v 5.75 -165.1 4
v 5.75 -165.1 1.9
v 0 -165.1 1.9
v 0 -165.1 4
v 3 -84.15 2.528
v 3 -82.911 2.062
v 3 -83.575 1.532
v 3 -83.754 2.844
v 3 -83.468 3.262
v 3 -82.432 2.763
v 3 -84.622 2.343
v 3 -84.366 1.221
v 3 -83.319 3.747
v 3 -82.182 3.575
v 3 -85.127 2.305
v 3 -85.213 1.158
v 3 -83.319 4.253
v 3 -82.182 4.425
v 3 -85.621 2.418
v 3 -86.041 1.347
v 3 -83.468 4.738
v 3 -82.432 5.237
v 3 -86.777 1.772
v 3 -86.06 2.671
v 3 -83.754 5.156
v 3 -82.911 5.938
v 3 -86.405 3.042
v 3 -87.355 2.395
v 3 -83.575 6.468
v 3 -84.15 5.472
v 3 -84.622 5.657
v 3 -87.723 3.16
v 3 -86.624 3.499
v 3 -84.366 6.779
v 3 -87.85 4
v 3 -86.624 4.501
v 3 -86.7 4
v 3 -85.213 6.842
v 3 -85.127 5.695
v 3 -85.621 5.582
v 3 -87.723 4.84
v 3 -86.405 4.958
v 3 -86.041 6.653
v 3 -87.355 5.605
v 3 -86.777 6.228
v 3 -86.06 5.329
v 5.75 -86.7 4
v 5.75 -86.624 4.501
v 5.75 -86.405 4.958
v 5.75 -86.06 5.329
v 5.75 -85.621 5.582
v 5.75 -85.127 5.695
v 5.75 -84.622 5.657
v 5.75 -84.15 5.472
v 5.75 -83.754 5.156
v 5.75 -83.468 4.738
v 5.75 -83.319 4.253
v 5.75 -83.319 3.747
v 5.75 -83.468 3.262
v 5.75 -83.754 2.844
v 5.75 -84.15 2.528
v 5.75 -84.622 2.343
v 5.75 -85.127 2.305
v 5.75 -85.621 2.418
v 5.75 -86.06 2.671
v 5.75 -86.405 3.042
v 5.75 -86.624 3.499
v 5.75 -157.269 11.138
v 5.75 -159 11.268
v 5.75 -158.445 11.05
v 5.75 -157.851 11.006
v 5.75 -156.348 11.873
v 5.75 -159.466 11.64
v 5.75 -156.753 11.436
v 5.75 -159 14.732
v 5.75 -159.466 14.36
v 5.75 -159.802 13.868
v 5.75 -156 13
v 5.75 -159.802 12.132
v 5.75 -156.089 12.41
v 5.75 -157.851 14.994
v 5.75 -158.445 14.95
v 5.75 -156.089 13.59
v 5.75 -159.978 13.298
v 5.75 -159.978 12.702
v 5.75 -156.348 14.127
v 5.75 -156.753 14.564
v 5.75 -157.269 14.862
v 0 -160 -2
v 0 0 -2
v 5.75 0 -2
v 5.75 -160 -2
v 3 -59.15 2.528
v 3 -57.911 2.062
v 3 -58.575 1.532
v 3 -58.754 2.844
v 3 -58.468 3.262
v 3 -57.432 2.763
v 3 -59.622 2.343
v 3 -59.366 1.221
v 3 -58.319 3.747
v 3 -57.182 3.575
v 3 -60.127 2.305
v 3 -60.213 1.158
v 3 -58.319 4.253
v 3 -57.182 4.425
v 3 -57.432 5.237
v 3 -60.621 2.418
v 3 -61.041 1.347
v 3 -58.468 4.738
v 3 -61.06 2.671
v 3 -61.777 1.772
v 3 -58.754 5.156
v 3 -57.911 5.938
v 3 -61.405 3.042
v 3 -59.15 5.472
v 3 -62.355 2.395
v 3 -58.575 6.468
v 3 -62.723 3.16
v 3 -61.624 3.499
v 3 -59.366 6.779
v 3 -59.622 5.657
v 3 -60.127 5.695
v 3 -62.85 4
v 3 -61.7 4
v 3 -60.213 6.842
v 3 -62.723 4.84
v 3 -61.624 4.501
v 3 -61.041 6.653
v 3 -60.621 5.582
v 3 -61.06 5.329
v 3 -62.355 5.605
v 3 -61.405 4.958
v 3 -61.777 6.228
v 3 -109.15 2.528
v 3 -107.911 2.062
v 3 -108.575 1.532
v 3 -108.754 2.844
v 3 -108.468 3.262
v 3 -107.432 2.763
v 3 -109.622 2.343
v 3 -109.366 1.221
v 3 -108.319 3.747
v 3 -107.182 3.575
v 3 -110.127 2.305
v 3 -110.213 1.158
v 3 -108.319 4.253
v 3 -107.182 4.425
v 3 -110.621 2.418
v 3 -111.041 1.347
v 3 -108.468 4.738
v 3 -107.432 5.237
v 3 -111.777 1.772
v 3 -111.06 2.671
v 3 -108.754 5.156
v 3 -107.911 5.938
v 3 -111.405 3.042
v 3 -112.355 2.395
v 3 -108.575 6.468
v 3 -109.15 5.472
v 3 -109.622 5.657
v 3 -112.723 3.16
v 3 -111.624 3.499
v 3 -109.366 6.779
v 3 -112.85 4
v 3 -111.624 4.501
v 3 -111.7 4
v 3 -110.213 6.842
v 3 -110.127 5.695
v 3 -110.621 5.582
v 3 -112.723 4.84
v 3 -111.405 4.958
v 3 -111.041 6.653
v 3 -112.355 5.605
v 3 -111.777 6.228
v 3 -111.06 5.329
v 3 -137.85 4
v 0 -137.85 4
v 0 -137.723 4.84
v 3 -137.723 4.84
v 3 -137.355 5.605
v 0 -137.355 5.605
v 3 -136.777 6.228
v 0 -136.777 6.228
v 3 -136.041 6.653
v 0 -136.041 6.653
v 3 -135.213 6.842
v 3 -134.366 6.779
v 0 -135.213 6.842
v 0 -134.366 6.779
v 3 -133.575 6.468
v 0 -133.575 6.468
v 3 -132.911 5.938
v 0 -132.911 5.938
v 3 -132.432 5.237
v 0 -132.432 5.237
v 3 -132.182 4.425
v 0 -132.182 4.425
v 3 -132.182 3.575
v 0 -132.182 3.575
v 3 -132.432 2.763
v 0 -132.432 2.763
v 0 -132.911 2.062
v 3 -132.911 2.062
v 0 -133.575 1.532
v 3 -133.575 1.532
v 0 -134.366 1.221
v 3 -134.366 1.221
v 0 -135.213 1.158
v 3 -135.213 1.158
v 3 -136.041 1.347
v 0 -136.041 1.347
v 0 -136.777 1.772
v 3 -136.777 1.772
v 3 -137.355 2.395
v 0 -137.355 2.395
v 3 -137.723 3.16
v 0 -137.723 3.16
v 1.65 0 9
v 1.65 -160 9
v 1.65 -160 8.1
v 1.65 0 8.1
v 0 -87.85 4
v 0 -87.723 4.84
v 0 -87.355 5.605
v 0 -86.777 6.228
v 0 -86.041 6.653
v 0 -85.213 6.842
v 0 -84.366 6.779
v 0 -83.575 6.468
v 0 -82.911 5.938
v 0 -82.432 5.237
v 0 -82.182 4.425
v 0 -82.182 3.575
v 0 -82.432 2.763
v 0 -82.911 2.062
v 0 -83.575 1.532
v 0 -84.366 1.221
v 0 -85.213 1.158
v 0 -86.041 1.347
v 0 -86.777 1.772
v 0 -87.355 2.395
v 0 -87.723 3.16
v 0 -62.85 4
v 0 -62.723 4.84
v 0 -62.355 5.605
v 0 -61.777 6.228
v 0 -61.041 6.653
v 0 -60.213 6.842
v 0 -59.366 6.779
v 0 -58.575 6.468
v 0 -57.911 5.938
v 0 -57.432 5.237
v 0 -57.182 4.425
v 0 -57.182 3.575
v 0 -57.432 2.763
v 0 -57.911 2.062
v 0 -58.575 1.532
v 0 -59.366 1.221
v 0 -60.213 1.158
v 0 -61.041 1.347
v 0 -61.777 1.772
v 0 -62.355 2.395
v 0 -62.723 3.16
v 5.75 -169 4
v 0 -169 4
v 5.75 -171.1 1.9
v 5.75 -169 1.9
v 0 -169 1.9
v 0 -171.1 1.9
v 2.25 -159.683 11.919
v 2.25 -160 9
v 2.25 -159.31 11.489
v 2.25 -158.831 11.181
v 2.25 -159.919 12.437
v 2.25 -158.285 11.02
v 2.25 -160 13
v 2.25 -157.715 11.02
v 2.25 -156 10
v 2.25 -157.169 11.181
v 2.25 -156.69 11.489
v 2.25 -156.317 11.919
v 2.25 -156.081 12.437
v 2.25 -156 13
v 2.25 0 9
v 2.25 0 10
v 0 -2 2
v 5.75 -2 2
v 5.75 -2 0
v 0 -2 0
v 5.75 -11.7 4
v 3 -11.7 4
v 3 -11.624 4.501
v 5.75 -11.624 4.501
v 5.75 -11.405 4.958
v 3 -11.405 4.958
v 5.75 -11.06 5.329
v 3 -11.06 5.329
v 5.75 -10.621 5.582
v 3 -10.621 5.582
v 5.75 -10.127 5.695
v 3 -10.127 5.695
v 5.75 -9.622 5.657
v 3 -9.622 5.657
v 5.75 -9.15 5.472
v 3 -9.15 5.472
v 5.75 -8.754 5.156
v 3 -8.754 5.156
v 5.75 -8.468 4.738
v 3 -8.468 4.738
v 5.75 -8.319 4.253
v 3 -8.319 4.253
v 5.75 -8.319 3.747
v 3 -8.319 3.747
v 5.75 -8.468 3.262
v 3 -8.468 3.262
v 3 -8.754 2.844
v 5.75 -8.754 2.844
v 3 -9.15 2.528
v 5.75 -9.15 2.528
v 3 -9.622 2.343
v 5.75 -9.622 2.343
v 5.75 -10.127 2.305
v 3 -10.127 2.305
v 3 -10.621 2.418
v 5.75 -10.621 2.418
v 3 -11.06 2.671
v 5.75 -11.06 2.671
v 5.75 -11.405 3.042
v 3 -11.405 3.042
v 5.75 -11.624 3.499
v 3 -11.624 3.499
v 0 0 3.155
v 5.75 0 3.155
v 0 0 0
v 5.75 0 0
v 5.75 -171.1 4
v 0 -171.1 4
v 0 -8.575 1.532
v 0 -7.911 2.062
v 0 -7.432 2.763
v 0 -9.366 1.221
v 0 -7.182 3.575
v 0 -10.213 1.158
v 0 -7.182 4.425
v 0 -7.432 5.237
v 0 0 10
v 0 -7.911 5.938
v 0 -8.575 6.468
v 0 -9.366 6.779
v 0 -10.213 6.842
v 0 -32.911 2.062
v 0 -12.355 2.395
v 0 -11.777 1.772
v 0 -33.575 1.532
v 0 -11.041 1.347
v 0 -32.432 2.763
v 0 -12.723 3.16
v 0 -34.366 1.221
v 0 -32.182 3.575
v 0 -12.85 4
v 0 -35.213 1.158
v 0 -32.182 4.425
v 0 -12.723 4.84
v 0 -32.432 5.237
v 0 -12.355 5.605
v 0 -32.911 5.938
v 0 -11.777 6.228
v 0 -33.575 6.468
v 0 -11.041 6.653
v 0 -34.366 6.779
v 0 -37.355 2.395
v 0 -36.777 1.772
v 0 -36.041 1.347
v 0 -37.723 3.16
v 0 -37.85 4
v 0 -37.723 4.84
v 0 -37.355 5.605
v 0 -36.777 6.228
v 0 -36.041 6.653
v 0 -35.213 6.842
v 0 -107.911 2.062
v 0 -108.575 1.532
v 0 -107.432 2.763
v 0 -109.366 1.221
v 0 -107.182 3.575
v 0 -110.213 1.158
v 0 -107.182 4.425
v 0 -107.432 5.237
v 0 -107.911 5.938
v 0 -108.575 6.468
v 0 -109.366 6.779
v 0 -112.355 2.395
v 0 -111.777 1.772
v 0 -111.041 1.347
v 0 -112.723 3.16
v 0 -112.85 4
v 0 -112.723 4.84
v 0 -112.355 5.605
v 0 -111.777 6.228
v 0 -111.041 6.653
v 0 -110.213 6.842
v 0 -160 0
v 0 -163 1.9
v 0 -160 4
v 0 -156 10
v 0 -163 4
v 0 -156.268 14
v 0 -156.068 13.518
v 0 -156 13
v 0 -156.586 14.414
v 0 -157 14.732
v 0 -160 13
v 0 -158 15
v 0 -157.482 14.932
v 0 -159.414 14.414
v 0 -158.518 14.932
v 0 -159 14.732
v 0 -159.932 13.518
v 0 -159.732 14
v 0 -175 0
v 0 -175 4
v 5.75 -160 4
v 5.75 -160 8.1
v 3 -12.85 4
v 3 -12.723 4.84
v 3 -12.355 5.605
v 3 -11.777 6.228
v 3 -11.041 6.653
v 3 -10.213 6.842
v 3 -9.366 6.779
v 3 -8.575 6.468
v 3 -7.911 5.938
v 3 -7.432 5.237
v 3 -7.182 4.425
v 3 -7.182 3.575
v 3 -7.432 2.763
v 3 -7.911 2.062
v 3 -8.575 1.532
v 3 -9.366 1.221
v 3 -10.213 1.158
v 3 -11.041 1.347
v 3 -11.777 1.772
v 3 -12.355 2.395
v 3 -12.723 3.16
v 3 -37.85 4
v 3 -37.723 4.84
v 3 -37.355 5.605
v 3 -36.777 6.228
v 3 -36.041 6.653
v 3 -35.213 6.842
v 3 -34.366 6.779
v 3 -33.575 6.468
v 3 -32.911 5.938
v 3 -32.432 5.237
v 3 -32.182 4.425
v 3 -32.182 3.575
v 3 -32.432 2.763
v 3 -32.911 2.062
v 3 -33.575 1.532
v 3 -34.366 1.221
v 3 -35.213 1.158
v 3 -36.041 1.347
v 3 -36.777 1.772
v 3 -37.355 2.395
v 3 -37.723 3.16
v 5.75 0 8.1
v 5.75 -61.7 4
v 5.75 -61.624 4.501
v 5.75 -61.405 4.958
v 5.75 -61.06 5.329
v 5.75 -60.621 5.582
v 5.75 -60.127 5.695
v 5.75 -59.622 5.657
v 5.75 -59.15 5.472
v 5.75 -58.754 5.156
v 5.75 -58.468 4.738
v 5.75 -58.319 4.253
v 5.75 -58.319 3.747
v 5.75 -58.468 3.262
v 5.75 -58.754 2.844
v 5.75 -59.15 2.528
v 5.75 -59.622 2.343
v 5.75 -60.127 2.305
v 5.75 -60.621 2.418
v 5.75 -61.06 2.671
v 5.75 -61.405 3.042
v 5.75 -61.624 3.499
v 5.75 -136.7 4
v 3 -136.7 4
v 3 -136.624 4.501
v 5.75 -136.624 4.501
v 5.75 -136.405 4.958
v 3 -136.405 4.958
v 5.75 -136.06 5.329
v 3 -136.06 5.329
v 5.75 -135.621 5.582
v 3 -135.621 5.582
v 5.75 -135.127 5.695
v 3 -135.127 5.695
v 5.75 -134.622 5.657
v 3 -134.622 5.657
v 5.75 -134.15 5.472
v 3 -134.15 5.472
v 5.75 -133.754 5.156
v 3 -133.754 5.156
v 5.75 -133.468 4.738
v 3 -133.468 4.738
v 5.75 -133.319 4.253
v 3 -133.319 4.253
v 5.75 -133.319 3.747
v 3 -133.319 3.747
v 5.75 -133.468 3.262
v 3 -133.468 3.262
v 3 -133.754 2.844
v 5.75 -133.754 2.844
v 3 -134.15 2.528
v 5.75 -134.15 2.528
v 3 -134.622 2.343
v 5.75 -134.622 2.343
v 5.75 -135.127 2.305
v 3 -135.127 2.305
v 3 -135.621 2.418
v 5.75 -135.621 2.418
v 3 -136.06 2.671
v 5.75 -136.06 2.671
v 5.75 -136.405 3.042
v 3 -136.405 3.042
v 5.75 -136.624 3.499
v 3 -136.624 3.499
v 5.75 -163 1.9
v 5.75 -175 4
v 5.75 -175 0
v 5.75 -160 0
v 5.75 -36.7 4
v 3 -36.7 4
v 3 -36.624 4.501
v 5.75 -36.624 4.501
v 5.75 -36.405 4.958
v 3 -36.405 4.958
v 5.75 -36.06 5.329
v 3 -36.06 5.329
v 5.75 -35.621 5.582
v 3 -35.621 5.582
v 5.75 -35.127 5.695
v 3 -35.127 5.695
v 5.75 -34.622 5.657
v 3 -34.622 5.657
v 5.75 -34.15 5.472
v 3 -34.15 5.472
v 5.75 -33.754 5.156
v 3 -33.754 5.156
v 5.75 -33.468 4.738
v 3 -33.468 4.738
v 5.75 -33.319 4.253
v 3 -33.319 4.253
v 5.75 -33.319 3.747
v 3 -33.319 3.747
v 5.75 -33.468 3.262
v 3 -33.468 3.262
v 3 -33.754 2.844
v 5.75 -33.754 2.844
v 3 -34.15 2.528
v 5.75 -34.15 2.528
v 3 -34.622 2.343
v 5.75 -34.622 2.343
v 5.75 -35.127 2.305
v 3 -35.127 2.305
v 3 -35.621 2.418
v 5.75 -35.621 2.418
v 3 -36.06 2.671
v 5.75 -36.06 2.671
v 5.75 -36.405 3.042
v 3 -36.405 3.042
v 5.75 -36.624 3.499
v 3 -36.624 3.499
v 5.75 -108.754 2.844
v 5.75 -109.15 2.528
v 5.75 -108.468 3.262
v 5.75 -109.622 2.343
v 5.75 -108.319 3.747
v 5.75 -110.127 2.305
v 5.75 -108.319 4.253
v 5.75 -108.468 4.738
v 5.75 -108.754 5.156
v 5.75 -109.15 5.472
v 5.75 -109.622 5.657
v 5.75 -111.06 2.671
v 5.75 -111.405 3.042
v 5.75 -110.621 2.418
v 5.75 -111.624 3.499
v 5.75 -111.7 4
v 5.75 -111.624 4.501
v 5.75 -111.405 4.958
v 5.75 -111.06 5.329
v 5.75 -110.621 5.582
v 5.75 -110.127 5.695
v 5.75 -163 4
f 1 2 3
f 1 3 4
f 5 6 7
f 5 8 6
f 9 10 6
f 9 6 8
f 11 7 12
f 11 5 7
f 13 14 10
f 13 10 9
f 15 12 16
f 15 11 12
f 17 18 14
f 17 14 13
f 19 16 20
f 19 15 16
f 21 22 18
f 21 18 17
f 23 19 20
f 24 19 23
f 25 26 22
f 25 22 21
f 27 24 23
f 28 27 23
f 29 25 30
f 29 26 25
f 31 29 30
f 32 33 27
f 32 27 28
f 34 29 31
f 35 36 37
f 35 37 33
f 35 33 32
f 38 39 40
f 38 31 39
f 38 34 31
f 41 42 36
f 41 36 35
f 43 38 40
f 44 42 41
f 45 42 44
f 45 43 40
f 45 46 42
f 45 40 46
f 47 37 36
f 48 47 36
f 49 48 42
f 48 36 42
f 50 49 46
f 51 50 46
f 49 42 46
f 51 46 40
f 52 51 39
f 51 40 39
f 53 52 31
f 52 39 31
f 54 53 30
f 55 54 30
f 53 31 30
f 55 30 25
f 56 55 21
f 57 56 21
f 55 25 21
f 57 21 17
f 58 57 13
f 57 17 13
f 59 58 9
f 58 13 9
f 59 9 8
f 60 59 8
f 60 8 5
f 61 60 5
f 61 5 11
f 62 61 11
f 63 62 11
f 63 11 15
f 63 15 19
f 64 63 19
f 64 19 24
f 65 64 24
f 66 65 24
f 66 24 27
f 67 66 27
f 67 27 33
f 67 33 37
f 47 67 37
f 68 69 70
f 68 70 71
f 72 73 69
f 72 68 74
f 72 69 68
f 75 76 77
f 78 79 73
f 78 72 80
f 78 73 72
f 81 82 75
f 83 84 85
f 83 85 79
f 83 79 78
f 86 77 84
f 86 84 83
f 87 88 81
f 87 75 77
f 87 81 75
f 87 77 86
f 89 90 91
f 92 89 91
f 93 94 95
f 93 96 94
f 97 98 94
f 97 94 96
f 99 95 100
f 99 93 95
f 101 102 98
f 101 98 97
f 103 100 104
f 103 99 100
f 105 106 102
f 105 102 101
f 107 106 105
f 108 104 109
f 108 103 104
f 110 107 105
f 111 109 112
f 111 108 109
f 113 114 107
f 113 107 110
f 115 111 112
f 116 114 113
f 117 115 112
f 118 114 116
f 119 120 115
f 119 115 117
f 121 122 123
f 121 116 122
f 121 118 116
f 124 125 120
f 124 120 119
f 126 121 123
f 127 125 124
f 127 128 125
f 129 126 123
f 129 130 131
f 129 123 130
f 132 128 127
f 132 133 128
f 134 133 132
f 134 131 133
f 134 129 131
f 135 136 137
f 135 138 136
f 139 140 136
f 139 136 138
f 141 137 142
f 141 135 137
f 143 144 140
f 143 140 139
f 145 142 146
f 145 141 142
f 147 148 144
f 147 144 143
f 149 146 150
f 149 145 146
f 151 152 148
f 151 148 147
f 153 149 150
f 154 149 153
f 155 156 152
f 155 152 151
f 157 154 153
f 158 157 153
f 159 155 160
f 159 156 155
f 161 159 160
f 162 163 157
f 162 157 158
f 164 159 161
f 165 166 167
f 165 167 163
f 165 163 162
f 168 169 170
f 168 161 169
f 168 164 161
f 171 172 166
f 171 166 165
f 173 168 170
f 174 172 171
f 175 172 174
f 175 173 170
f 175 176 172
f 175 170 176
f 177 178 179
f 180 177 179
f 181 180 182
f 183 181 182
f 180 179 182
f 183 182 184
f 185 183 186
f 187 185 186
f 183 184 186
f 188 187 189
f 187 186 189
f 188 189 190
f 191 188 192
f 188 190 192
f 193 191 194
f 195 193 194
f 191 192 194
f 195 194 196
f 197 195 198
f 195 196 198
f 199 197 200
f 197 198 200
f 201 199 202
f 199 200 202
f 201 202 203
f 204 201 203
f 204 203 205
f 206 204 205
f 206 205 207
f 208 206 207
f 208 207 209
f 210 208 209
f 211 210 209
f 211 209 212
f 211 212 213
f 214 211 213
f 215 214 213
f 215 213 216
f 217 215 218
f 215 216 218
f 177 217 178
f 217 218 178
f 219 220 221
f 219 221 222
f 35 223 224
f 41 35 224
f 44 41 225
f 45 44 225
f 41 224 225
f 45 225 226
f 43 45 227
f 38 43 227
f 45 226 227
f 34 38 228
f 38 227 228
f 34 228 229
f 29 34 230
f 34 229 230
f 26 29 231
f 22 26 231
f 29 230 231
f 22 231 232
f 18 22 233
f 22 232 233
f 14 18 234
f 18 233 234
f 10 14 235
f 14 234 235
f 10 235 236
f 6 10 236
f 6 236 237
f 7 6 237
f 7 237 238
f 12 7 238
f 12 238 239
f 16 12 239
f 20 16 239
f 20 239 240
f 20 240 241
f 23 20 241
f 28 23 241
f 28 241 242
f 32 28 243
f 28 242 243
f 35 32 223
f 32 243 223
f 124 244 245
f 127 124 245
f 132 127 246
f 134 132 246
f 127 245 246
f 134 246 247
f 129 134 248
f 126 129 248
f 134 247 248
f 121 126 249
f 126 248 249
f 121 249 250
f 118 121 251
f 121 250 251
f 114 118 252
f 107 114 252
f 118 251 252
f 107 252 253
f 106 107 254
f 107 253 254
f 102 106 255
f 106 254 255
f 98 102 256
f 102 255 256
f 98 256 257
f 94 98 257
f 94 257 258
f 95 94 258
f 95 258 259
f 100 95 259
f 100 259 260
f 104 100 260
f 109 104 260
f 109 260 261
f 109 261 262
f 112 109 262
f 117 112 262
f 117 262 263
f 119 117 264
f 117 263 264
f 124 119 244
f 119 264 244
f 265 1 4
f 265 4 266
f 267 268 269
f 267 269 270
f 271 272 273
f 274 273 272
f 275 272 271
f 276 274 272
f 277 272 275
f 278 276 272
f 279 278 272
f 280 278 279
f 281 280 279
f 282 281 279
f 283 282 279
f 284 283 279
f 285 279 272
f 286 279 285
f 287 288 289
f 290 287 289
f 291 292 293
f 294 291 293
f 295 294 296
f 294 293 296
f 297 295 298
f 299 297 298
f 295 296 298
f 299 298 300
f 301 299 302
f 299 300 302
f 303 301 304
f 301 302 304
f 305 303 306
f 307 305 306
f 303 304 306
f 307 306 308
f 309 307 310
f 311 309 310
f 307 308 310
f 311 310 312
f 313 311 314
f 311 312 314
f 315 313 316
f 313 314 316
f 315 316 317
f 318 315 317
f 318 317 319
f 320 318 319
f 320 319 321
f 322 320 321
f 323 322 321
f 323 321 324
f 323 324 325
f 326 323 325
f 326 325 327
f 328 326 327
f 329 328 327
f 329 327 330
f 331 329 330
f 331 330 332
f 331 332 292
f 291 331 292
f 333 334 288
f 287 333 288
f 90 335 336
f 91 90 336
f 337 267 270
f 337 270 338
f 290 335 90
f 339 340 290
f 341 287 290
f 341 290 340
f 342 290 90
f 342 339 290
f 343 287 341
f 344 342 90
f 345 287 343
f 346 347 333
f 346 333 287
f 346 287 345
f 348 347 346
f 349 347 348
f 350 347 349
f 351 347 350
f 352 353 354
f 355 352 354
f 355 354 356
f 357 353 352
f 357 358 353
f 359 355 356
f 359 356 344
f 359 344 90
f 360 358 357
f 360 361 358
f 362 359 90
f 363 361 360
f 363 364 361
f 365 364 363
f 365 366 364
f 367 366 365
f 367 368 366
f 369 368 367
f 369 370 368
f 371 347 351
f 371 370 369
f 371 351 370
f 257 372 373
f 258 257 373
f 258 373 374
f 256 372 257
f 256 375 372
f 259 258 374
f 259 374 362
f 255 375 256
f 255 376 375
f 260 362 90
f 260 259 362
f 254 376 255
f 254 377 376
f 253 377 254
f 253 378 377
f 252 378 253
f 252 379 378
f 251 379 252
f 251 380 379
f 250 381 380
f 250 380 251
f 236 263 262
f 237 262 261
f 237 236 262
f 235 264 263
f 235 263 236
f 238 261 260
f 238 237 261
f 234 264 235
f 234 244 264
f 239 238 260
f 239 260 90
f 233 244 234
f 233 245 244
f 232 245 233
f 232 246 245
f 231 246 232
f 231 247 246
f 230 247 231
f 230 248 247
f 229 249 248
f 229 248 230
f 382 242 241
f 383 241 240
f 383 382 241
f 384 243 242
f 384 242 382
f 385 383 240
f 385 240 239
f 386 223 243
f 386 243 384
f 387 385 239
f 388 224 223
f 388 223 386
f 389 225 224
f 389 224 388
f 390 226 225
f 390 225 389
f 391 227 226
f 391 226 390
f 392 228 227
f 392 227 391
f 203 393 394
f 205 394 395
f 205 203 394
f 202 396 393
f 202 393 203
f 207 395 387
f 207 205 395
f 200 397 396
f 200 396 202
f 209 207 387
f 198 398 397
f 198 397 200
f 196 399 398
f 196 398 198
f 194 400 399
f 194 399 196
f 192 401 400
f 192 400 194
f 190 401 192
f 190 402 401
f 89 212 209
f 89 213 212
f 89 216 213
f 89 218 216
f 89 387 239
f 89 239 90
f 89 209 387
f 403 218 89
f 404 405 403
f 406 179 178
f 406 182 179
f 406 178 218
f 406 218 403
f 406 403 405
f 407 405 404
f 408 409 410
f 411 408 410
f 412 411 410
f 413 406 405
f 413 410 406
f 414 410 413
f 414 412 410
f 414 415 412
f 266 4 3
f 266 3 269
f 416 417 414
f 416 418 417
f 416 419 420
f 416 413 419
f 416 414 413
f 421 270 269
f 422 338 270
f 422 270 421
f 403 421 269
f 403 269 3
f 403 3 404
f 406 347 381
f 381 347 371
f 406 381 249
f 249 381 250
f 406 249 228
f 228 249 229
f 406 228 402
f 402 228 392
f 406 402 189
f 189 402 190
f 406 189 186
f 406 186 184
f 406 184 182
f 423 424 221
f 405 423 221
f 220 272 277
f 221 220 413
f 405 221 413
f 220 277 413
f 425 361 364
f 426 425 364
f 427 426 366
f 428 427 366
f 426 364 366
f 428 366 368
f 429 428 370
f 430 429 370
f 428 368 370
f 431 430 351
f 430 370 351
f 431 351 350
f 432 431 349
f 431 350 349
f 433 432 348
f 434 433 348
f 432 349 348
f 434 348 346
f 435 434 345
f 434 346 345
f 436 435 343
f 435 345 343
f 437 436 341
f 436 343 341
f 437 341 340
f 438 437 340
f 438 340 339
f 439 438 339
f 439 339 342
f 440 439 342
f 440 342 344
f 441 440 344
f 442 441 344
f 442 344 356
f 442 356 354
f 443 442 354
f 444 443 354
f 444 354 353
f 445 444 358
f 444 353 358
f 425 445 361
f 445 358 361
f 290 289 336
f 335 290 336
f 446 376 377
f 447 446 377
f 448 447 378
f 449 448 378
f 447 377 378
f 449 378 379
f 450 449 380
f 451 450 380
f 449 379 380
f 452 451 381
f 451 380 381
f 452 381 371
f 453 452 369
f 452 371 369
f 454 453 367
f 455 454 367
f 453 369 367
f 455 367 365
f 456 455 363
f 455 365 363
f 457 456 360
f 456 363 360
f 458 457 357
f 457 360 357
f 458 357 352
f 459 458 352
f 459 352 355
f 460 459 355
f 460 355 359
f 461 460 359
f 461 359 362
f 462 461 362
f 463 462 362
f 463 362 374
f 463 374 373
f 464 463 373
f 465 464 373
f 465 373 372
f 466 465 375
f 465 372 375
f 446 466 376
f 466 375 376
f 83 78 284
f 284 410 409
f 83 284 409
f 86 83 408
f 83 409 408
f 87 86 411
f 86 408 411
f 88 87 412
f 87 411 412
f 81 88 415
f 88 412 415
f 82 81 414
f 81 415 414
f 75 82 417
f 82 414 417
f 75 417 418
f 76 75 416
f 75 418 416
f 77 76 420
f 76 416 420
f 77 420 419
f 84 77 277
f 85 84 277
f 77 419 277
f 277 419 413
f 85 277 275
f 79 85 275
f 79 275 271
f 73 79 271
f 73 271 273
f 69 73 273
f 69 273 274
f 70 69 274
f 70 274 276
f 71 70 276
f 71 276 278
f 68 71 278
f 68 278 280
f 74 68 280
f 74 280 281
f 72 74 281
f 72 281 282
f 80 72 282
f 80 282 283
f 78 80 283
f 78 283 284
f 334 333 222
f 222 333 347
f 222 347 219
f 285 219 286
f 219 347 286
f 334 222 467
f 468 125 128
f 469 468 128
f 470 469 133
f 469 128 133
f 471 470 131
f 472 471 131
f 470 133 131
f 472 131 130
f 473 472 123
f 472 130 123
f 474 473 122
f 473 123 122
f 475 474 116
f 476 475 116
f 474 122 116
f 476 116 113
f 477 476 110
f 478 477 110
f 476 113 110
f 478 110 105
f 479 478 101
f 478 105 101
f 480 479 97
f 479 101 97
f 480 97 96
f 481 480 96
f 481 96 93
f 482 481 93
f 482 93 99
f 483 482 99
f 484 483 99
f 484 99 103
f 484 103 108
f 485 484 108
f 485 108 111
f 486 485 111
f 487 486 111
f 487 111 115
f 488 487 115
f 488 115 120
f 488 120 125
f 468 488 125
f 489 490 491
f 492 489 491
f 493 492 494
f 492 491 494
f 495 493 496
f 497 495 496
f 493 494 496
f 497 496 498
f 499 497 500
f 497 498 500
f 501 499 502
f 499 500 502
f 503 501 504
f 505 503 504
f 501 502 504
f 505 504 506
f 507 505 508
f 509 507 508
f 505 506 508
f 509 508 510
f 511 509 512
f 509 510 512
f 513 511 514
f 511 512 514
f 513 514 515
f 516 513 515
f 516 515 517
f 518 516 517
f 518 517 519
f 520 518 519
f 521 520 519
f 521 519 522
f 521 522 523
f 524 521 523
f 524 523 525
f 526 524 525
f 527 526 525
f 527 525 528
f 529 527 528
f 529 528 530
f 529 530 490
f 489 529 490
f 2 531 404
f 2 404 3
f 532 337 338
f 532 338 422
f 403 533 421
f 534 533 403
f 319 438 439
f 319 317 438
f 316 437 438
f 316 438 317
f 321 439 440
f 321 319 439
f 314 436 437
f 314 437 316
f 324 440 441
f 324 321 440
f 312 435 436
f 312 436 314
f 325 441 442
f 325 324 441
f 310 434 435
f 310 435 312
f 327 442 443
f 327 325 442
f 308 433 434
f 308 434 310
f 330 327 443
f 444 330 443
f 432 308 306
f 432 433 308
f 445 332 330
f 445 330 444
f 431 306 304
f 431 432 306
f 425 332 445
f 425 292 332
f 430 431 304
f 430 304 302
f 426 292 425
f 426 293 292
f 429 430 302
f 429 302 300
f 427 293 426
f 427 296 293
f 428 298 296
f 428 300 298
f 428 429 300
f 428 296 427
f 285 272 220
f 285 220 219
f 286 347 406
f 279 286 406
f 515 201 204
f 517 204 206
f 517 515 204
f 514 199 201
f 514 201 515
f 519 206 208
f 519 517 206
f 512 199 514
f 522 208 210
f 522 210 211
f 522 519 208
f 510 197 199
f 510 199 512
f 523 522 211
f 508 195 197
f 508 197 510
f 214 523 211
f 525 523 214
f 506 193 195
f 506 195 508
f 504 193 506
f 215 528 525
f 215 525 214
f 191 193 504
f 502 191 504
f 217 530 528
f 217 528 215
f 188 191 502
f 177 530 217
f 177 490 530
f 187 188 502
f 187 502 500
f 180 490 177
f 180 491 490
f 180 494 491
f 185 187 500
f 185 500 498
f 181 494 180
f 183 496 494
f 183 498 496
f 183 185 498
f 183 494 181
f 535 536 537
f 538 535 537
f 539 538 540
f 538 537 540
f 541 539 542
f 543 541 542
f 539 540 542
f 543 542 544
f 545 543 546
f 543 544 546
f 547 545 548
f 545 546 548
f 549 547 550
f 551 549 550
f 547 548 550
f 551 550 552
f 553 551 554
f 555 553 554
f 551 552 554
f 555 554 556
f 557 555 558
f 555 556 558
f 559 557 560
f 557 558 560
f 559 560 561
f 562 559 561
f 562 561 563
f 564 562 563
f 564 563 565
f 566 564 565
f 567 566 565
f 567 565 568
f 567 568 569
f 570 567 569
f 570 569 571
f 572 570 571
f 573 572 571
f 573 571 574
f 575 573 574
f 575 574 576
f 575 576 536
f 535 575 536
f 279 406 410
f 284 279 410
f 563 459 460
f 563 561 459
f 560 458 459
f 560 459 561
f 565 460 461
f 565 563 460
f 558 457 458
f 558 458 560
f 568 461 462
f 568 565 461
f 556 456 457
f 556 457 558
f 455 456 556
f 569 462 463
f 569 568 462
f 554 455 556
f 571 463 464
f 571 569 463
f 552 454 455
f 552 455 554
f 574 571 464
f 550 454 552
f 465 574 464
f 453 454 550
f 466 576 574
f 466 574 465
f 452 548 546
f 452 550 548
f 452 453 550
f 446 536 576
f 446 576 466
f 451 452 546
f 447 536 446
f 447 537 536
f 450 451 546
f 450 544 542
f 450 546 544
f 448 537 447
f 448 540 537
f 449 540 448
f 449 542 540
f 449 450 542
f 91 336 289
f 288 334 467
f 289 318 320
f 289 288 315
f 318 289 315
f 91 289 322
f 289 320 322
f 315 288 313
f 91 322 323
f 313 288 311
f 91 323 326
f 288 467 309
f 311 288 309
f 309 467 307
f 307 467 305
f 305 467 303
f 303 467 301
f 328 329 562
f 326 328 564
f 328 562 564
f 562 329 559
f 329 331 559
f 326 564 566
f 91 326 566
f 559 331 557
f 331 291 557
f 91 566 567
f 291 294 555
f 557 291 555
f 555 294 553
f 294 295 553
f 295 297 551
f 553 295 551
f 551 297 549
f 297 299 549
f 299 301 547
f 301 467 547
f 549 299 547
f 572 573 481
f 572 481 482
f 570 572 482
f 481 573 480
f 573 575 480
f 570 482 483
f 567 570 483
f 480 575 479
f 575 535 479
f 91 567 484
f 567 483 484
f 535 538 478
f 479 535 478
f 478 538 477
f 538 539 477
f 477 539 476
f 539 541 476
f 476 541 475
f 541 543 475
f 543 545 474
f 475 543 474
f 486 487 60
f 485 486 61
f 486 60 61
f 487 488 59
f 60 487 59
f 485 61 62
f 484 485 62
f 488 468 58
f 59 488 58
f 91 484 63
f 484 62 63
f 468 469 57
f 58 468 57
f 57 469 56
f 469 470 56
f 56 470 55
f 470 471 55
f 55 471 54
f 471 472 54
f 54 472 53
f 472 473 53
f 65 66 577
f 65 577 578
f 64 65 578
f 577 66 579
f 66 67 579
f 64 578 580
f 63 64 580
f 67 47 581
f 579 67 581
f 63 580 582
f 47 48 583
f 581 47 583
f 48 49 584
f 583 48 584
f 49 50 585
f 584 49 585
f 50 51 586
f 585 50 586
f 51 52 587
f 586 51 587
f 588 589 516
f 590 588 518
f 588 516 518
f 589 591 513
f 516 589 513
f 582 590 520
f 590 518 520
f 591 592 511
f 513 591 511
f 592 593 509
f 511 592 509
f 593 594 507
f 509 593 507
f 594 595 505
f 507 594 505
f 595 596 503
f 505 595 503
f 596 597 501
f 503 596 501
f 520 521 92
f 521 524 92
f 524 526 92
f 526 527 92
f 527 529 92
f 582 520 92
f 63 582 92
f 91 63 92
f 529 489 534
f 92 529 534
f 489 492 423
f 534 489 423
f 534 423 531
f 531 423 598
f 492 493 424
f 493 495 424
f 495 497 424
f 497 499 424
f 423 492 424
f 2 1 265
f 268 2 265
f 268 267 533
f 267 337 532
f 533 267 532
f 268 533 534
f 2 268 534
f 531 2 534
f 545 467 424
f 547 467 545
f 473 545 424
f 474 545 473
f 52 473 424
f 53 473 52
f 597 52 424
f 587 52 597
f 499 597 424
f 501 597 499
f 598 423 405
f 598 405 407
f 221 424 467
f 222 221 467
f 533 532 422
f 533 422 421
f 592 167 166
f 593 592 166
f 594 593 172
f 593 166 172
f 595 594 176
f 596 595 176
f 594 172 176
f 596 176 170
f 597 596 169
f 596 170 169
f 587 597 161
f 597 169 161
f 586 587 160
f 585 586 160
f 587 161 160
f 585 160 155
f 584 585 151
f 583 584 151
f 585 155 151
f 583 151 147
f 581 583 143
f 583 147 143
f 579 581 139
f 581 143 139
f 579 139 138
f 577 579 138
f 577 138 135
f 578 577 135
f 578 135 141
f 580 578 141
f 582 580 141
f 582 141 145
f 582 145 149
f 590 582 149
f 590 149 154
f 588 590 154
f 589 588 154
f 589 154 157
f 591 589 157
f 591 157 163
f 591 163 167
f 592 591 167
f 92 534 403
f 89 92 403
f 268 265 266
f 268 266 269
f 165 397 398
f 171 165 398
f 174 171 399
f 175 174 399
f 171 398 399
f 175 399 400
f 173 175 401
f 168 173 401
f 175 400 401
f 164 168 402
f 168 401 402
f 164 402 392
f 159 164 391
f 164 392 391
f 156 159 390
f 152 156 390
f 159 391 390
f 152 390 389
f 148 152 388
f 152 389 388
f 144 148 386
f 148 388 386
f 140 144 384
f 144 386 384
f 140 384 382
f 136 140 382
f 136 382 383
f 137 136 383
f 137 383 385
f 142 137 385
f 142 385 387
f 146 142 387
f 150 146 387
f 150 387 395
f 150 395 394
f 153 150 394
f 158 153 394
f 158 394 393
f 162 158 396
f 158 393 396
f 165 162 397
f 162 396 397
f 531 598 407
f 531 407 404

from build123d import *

# Parameters (mm, degrees)
F1_DEPTH  = 5.75
F2_W      = 160
F2_H      = 0.9
F3_DEPTH  = 4.1
F5_DEPTH  = 3.5
F6_R      = 1.7
F7_DEPTH  = 25
F8_R      = 2.85
F8_R_2    = 1.7
F9_DEPTH  = 3
F11_DEPTH = 3.5
F12_W     = 2
F12_H     = 160
F12_W_2   = 3.75
F13_DEPTH = 2
F15_DEPTH = 5.75
F17_DEPTH = 25


# Not quite as in the source:
# - a feature names something its author has since deleted; it is built from what else it names


with BuildPart() as f1:
    # F0 (on Right) → F1 (new body)
    with BuildSketch(Plane.YZ):
        Polygon((-156, 10), (-160, 10), (-160, 0), (0, 0), (0, 10), align=None)
        with BuildLine():
            Line((-160, 13), (-160, 10))
            Line((-160, 10), (-156, 10))
            Line((-156, 10), (-156, 13))
            ThreePointArc((-156, 13), (-156.5857864376, 14.4142135624), (-158, 15))
            ThreePointArc((-158, 15), (-159.4142135624, 14.4142135624), (-160, 13))
        make_face()
    extrude(amount=F1_DEPTH)

    # F2 (on face) → F3 (cut)
    with BuildSketch(Plane.YZ.offset(5.75)):
        with Locations((-80, 8.55)):
            Rectangle(F2_W, F2_H)
    extrude(amount=-F3_DEPTH, mode=Mode.SUBTRACT)

    # F4 (on face) → F5 (cut)
    with BuildSketch(Plane.YZ.offset(5.75)):
        with BuildLine():
            ThreePointArc((-156, 13), (-158, 15), (-160, 13))
            Line((-160, 13), (-160, 9))
            Line((-160, 9), (0, 9))
            Line((0, 9), (0, 10))
            Line((0, 10), (-156, 10))
            Line((-156, 10), (-156, 13))
        make_face()
    extrude(amount=-F5_DEPTH, mode=Mode.SUBTRACT)

    # F6 (on face) → F7 (cut)
    with BuildSketch(Plane(origin=(0, 0, 0), x_dir=(0, -1, 0), z_dir=(-1, 0, 0))):
        with Locations((135, 4)):
            Circle(F6_R)
        with Locations((110, 4)):
            Circle(F6_R)
        with Locations((85, 4)):
            Circle(F6_R)
        with Locations((60, 4)):
            Circle(F6_R)
        with Locations((35, 4)):
            Circle(F6_R)
        with Locations((10, 4)):
            Circle(F6_R)
    extrude(amount=-F7_DEPTH, mode=Mode.SUBTRACT)

    # F8 (on face) → F9 (cut)
    with BuildSketch(Plane(origin=(0, 0, 0), x_dir=(0, -1, 0), z_dir=(-1, 0, 0))):
        with Locations((135, 4)):
            Circle(F8_R)
        with Locations((135, 4)):
            Circle(F8_R_2, mode=Mode.SUBTRACT)
        with Locations((110, 4)):
            Circle(F8_R)
        with Locations((110, 4)):
            Circle(F8_R_2, mode=Mode.SUBTRACT)
        with Locations((85, 4)):
            Circle(F8_R)
        with Locations((85, 4)):
            Circle(F8_R_2, mode=Mode.SUBTRACT)
        with Locations((60, 4)):
            Circle(F8_R)
        with Locations((60, 4)):
            Circle(F8_R_2, mode=Mode.SUBTRACT)
        with Locations((35, 4)):
            Circle(F8_R)
        with Locations((35, 4)):
            Circle(F8_R_2, mode=Mode.SUBTRACT)
        with Locations((10, 4)):
            Circle(F8_R)
        with Locations((10, 4)):
            Circle(F8_R_2, mode=Mode.SUBTRACT)
    extrude(amount=-F9_DEPTH, mode=Mode.SUBTRACT)

    # F10 (on face) → F11 (join, through all)
    with BuildSketch(Plane.YZ.offset(2.25)):
        with BuildLine():
            ThreePointArc((-160, 13), (-158, 11), (-156, 13))
            ThreePointArc((-156, 13), (-158, 15), (-160, 13))
        make_face()
    extrude(amount=F11_DEPTH)

    # F12 (on face) → F13 (join)
    with BuildSketch(Plane(origin=(0, 0, 0), x_dir=(1, 0, 0), z_dir=(0, 0, -1))):
        with Locations((1, 80)):
            Rectangle(F12_W, F12_H)
        with Locations((3.875, 80)):
            Rectangle(F12_W_2, F12_H)
    extrude(amount=F13_DEPTH)

    # F14 (on face) → F15 (join, through all)
    with BuildSketch(Plane.YZ.offset(5.75)):
        Polygon((-175, 0), (-160, 0), (-160, 4), (-163, 4), (-163, 1.9), (-165.1, 1.9), (-165.1, 4), (-169, 4), (-169, 1.9), (-171.1, 1.9), (-171.1, 4), (-175, 4), align=None)
    extrude(amount=-F15_DEPTH)

    # F16 (on face) → F17 (cut)
    with BuildSketch(Plane.YZ.offset(5.75)):
        Polygon((-2, 0), (0, 0), (0, 3.1547005384), (-2, 2), align=None)
    extrude(amount=-F17_DEPTH, mode=Mode.SUBTRACT)


solid = f1.part
